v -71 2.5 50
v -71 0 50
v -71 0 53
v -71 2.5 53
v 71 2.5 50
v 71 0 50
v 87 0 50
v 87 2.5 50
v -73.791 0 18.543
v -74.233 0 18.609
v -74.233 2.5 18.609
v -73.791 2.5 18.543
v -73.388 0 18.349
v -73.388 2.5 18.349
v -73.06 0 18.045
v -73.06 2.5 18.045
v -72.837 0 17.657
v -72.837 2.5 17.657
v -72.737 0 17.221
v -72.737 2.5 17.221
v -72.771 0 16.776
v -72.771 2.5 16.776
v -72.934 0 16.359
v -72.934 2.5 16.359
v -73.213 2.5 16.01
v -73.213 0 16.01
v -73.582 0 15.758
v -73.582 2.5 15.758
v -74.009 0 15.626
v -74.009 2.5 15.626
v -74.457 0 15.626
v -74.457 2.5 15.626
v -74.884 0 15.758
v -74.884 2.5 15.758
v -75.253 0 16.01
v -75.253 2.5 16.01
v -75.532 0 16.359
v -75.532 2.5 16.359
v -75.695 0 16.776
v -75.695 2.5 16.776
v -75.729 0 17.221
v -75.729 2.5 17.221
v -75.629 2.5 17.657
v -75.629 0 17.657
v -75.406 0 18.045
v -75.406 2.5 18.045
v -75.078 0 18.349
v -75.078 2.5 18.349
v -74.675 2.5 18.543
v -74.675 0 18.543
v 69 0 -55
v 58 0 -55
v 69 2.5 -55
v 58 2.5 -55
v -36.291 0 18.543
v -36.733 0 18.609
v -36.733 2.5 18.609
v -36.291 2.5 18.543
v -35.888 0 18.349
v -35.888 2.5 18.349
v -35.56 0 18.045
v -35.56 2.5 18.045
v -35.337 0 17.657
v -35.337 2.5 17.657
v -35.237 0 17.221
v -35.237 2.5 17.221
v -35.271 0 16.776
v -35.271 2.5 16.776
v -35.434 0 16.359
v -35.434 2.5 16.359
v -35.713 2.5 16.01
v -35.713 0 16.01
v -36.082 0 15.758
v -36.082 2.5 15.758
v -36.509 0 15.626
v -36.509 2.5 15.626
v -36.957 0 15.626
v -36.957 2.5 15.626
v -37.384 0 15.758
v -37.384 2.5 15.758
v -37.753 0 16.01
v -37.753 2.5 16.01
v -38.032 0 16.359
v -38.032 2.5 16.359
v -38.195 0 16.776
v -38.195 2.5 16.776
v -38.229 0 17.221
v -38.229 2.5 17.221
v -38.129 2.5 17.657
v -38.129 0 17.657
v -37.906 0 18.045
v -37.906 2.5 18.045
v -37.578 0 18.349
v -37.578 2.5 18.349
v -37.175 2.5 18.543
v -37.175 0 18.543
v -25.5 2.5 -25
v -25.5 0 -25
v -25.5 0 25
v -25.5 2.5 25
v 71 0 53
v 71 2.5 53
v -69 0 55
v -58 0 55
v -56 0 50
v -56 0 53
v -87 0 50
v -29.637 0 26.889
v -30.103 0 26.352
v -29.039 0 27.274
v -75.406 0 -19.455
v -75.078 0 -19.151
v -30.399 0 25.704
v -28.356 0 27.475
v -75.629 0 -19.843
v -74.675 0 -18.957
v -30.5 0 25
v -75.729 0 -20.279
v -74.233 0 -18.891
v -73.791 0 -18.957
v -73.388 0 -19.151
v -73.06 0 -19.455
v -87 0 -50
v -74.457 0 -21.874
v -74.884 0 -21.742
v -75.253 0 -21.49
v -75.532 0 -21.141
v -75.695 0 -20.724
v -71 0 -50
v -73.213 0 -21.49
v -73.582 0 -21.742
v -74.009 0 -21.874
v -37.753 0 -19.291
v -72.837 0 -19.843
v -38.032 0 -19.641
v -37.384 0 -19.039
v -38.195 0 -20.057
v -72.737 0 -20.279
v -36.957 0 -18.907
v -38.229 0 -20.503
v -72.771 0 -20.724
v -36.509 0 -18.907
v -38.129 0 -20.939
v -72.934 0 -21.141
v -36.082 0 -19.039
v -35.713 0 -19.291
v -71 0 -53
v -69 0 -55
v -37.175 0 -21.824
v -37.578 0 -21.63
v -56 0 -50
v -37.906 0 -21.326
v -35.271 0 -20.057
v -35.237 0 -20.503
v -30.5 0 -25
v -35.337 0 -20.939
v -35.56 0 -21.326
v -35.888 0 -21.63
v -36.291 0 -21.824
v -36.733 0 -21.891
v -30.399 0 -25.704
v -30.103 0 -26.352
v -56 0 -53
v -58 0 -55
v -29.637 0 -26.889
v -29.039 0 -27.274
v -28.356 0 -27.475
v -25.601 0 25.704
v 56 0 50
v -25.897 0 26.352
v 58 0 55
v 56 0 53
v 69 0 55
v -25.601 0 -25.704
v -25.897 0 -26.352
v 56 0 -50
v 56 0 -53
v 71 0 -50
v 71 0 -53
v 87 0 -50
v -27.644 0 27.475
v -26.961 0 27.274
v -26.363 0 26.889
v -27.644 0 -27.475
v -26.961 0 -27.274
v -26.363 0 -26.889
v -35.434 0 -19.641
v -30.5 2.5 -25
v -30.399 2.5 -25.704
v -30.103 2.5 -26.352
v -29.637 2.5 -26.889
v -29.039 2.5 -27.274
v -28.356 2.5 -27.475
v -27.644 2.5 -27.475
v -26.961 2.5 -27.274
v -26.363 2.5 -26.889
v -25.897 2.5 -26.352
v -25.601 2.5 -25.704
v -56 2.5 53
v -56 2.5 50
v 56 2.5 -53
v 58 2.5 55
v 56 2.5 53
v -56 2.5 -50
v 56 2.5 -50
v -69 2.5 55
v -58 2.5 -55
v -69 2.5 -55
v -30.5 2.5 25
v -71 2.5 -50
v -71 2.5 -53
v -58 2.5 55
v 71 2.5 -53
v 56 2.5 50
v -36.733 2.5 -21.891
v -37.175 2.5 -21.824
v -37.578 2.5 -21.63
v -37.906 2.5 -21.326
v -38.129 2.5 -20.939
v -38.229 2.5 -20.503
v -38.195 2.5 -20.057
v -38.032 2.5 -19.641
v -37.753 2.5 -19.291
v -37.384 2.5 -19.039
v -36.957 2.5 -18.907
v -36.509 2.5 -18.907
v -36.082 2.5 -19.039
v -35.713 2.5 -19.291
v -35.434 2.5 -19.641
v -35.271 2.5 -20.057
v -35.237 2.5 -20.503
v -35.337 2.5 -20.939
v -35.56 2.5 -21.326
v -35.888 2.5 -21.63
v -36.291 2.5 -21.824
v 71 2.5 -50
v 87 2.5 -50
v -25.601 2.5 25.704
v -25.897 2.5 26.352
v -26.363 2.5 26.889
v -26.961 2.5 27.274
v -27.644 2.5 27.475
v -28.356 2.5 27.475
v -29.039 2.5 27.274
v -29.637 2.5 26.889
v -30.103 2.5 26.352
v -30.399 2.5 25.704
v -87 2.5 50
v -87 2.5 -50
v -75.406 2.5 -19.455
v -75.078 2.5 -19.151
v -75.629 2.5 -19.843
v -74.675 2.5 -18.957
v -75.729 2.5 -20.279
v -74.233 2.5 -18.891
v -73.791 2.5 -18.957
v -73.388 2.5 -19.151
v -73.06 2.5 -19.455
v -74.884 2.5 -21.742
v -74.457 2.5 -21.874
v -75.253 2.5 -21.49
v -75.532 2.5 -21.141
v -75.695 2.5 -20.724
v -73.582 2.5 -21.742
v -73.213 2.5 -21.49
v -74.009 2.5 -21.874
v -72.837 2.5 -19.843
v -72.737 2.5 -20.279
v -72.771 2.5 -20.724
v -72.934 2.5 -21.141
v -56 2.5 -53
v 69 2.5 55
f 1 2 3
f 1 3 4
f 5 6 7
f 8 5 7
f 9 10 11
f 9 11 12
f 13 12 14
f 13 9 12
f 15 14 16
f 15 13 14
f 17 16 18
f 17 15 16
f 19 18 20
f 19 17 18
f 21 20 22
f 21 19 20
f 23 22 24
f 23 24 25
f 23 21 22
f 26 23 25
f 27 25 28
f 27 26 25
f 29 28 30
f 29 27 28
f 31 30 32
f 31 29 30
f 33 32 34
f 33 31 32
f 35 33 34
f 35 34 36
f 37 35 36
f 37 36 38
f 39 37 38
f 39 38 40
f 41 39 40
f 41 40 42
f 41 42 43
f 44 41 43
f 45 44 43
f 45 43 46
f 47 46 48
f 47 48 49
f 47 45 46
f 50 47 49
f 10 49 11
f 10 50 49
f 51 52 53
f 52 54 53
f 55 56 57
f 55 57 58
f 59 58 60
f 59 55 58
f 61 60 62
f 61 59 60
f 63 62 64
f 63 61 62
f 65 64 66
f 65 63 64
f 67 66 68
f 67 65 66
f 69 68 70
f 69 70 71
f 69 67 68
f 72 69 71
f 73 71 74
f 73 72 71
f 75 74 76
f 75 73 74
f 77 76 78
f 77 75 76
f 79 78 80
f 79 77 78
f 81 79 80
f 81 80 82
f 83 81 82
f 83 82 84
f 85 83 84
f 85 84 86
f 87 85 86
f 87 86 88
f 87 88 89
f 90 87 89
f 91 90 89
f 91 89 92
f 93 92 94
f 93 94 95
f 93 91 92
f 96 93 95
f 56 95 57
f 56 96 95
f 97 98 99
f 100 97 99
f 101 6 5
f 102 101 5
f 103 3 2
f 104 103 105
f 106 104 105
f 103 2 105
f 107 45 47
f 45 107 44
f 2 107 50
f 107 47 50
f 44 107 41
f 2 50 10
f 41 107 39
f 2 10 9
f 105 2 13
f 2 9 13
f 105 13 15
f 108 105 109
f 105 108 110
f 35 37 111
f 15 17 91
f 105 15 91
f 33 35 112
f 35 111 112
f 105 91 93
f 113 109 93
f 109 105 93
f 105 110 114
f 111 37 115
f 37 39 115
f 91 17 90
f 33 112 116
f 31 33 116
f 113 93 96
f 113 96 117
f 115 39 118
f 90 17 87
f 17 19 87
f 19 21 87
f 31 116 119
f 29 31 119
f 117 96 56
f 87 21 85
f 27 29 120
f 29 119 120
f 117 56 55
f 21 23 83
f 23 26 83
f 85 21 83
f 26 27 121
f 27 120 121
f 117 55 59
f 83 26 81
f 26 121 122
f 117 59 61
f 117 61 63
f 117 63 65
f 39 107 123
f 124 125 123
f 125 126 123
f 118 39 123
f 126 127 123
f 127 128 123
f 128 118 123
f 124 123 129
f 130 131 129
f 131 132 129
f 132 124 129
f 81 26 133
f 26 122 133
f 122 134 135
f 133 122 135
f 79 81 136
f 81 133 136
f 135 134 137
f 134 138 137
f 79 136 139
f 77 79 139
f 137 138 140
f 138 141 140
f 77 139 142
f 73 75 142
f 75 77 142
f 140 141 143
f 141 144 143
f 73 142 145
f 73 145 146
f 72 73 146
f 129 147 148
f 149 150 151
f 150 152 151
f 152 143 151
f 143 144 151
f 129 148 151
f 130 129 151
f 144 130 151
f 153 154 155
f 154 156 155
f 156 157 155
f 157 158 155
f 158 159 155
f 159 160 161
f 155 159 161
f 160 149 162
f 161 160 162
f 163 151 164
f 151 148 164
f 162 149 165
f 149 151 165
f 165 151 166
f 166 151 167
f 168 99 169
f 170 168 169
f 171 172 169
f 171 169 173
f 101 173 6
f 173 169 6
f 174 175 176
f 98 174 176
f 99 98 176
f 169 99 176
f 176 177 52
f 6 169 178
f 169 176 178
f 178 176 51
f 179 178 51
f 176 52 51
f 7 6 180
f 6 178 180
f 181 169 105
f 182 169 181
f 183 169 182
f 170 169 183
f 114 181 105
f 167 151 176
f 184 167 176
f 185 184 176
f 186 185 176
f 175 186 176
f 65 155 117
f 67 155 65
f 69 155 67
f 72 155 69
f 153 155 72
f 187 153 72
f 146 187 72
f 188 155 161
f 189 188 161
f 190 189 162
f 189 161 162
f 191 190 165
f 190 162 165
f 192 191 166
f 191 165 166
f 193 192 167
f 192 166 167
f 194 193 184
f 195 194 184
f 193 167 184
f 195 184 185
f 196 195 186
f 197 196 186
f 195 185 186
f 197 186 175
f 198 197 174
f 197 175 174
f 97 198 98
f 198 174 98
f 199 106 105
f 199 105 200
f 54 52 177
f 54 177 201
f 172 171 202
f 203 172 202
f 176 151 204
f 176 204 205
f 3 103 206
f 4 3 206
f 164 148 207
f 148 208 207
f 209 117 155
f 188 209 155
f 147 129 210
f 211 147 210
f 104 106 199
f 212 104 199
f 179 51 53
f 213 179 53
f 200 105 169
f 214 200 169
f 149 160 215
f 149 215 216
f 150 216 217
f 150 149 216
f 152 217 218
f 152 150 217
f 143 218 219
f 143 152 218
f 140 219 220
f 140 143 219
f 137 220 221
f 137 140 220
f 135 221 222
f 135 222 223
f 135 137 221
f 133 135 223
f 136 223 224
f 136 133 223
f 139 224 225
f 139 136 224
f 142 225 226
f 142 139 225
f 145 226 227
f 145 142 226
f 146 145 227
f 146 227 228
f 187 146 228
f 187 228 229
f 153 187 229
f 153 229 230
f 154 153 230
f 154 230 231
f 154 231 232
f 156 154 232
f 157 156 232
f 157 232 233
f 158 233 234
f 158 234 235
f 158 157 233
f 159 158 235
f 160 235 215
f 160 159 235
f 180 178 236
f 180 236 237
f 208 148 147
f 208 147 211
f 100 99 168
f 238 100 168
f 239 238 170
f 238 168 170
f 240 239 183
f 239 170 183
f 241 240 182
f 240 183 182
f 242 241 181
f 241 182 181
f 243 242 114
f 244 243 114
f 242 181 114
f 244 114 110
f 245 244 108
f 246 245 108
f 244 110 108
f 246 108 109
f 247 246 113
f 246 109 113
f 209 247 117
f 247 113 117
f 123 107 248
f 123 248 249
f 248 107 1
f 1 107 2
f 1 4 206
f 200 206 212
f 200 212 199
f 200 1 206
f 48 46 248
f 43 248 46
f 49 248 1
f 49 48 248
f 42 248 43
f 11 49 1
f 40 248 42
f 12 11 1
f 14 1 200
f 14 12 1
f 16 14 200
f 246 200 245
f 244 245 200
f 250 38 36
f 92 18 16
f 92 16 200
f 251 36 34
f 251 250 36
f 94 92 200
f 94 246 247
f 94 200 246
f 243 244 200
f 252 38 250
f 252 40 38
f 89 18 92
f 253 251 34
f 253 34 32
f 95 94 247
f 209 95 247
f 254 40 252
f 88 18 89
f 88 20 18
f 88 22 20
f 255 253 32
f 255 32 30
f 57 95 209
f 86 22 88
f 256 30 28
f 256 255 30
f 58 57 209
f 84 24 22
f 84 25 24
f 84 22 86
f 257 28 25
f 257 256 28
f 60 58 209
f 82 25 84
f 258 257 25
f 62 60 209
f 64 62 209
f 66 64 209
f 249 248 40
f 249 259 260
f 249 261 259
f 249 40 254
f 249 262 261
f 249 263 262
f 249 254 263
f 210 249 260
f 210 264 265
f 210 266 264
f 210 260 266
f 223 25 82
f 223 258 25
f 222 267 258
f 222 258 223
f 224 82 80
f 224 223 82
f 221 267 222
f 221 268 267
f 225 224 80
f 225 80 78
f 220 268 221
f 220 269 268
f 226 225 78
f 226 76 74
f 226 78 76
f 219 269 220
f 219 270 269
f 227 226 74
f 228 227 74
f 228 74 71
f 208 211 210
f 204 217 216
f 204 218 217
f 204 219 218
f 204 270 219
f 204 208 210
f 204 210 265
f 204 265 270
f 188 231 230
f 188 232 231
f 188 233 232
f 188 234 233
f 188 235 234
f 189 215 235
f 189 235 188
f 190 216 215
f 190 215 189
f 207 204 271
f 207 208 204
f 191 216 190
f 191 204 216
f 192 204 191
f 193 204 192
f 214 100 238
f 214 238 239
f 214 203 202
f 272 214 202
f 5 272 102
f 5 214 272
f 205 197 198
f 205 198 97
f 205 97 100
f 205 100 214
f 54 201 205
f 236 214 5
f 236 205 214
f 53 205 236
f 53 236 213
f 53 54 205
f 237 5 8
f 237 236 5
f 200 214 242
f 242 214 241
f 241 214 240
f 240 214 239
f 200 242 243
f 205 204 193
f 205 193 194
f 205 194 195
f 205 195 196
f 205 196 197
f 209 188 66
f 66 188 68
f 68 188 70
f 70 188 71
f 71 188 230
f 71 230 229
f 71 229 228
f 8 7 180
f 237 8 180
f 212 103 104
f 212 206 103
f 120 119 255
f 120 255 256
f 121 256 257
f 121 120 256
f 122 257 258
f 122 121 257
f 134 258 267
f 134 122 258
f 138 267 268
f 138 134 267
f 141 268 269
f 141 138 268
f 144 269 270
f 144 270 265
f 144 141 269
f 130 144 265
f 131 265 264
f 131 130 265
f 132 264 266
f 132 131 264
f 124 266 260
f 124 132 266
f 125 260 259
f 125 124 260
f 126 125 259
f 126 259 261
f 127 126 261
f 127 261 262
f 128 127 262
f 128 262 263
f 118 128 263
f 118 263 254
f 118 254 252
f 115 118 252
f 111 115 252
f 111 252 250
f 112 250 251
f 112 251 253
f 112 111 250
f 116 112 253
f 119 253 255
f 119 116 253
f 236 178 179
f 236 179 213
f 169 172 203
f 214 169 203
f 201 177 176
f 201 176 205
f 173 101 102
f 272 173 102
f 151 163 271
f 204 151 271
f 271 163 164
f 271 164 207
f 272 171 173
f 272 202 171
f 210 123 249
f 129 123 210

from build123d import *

# Parameters (mm, degrees)
SKETCH1_W           = 174
SKETCH1_H           = 100
BOSS_EXTRUDE1_DEPTH = 2.5
SKETCH2_W           = 15
SKETCH2_H           = 2.5
BOSS_EXTRUDE2_DEPTH = 5
CHAMFER1_SIZE       = 2


with BuildPart() as part:
    # Sketch1 → Boss-Extrude1 (new body)
    with BuildSketch(Plane(origin=(0, 0, 0), x_dir=(1, 0, 0), z_dir=(0, 1, 0))):
        Rectangle(SKETCH1_W, SKETCH1_H)
        with BuildLine():
            Line((-25.5, 25), (-25.5, -25))
            ThreePointArc((-25.5, -25), (-28, -27.5), (-30.5, -25))
            Line((-30.5, -25), (-30.5, 25))
            ThreePointArc((-30.5, 25), (-28, 27.5), (-25.5, 25))
        make_face(mode=Mode.SUBTRACT)
        with BuildLine():
            ThreePointArc((-36.73295862, -15.609359563), (-38.23295862, -17.109359563), (-36.73295862, -18.609359563))
            ThreePointArc((-36.73295862, -18.609359563), (-35.23295862, -17.109359563), (-36.73295862, -15.609359563))
        make_face(mode=Mode.SUBTRACT)
        with BuildLine():
            ThreePointArc((-36.73295862, 18.890640437), (-35.23295862, 20.390640437), (-36.73295862, 21.890640437))
            ThreePointArc((-36.73295862, 21.890640437), (-38.23295862, 20.390640437), (-36.73295862, 18.890640437))
        make_face(mode=Mode.SUBTRACT)
        with BuildLine():
            ThreePointArc((-74.23295862, 21.890640437), (-75.73295862, 20.390640437), (-74.23295862, 18.890640437))
            ThreePointArc((-74.23295862, 18.890640437), (-72.73295862, 20.390640437), (-74.23295862, 21.890640437))
        make_face(mode=Mode.SUBTRACT)
        with BuildLine():
            ThreePointArc((-74.23295862, -15.609359563), (-75.73295862, -17.109359563), (-74.23295862, -18.609359563))
            ThreePointArc((-74.23295862, -18.609359563), (-72.73295862, -17.109359563), (-74.23295862, -15.609359563))
        make_face(mode=Mode.SUBTRACT)
    extrude(amount=BOSS_EXTRUDE1_DEPTH)

    # Sketch2 → Boss-Extrude2 (add)
    with BuildSketch(Plane.XY.offset(50)):
        with Locations((-63.5, 1.25)):
            Rectangle(SKETCH2_W, SKETCH2_H)
        with Locations((63.5, 1.25)):
            Rectangle(SKETCH2_W, SKETCH2_H)
    boss_extrude2 = extrude(amount=BOSS_EXTRUDE2_DEPTH)

    # Mirror1: Boss-Extrude2 across plane
    add(boss_extrude2.mirror(Plane.XY))

    # Chamfer1
    chamfer1_edges = [part.edges().sort_by_distance(p)[0] for p in [
        (-71, 1.25, 55),
        (-56, 1.25, 55),
        (56, 1.25, 55),
        (71, 1.25, 55),
        (-56, 1.25, -55),
        (-71, 1.25, -55),
        (71, 1.25, -55),
        (56, 1.25, -55),
    ]]
    chamfer(chamfer1_edges, length=CHAMFER1_SIZE)


solid = part.part
